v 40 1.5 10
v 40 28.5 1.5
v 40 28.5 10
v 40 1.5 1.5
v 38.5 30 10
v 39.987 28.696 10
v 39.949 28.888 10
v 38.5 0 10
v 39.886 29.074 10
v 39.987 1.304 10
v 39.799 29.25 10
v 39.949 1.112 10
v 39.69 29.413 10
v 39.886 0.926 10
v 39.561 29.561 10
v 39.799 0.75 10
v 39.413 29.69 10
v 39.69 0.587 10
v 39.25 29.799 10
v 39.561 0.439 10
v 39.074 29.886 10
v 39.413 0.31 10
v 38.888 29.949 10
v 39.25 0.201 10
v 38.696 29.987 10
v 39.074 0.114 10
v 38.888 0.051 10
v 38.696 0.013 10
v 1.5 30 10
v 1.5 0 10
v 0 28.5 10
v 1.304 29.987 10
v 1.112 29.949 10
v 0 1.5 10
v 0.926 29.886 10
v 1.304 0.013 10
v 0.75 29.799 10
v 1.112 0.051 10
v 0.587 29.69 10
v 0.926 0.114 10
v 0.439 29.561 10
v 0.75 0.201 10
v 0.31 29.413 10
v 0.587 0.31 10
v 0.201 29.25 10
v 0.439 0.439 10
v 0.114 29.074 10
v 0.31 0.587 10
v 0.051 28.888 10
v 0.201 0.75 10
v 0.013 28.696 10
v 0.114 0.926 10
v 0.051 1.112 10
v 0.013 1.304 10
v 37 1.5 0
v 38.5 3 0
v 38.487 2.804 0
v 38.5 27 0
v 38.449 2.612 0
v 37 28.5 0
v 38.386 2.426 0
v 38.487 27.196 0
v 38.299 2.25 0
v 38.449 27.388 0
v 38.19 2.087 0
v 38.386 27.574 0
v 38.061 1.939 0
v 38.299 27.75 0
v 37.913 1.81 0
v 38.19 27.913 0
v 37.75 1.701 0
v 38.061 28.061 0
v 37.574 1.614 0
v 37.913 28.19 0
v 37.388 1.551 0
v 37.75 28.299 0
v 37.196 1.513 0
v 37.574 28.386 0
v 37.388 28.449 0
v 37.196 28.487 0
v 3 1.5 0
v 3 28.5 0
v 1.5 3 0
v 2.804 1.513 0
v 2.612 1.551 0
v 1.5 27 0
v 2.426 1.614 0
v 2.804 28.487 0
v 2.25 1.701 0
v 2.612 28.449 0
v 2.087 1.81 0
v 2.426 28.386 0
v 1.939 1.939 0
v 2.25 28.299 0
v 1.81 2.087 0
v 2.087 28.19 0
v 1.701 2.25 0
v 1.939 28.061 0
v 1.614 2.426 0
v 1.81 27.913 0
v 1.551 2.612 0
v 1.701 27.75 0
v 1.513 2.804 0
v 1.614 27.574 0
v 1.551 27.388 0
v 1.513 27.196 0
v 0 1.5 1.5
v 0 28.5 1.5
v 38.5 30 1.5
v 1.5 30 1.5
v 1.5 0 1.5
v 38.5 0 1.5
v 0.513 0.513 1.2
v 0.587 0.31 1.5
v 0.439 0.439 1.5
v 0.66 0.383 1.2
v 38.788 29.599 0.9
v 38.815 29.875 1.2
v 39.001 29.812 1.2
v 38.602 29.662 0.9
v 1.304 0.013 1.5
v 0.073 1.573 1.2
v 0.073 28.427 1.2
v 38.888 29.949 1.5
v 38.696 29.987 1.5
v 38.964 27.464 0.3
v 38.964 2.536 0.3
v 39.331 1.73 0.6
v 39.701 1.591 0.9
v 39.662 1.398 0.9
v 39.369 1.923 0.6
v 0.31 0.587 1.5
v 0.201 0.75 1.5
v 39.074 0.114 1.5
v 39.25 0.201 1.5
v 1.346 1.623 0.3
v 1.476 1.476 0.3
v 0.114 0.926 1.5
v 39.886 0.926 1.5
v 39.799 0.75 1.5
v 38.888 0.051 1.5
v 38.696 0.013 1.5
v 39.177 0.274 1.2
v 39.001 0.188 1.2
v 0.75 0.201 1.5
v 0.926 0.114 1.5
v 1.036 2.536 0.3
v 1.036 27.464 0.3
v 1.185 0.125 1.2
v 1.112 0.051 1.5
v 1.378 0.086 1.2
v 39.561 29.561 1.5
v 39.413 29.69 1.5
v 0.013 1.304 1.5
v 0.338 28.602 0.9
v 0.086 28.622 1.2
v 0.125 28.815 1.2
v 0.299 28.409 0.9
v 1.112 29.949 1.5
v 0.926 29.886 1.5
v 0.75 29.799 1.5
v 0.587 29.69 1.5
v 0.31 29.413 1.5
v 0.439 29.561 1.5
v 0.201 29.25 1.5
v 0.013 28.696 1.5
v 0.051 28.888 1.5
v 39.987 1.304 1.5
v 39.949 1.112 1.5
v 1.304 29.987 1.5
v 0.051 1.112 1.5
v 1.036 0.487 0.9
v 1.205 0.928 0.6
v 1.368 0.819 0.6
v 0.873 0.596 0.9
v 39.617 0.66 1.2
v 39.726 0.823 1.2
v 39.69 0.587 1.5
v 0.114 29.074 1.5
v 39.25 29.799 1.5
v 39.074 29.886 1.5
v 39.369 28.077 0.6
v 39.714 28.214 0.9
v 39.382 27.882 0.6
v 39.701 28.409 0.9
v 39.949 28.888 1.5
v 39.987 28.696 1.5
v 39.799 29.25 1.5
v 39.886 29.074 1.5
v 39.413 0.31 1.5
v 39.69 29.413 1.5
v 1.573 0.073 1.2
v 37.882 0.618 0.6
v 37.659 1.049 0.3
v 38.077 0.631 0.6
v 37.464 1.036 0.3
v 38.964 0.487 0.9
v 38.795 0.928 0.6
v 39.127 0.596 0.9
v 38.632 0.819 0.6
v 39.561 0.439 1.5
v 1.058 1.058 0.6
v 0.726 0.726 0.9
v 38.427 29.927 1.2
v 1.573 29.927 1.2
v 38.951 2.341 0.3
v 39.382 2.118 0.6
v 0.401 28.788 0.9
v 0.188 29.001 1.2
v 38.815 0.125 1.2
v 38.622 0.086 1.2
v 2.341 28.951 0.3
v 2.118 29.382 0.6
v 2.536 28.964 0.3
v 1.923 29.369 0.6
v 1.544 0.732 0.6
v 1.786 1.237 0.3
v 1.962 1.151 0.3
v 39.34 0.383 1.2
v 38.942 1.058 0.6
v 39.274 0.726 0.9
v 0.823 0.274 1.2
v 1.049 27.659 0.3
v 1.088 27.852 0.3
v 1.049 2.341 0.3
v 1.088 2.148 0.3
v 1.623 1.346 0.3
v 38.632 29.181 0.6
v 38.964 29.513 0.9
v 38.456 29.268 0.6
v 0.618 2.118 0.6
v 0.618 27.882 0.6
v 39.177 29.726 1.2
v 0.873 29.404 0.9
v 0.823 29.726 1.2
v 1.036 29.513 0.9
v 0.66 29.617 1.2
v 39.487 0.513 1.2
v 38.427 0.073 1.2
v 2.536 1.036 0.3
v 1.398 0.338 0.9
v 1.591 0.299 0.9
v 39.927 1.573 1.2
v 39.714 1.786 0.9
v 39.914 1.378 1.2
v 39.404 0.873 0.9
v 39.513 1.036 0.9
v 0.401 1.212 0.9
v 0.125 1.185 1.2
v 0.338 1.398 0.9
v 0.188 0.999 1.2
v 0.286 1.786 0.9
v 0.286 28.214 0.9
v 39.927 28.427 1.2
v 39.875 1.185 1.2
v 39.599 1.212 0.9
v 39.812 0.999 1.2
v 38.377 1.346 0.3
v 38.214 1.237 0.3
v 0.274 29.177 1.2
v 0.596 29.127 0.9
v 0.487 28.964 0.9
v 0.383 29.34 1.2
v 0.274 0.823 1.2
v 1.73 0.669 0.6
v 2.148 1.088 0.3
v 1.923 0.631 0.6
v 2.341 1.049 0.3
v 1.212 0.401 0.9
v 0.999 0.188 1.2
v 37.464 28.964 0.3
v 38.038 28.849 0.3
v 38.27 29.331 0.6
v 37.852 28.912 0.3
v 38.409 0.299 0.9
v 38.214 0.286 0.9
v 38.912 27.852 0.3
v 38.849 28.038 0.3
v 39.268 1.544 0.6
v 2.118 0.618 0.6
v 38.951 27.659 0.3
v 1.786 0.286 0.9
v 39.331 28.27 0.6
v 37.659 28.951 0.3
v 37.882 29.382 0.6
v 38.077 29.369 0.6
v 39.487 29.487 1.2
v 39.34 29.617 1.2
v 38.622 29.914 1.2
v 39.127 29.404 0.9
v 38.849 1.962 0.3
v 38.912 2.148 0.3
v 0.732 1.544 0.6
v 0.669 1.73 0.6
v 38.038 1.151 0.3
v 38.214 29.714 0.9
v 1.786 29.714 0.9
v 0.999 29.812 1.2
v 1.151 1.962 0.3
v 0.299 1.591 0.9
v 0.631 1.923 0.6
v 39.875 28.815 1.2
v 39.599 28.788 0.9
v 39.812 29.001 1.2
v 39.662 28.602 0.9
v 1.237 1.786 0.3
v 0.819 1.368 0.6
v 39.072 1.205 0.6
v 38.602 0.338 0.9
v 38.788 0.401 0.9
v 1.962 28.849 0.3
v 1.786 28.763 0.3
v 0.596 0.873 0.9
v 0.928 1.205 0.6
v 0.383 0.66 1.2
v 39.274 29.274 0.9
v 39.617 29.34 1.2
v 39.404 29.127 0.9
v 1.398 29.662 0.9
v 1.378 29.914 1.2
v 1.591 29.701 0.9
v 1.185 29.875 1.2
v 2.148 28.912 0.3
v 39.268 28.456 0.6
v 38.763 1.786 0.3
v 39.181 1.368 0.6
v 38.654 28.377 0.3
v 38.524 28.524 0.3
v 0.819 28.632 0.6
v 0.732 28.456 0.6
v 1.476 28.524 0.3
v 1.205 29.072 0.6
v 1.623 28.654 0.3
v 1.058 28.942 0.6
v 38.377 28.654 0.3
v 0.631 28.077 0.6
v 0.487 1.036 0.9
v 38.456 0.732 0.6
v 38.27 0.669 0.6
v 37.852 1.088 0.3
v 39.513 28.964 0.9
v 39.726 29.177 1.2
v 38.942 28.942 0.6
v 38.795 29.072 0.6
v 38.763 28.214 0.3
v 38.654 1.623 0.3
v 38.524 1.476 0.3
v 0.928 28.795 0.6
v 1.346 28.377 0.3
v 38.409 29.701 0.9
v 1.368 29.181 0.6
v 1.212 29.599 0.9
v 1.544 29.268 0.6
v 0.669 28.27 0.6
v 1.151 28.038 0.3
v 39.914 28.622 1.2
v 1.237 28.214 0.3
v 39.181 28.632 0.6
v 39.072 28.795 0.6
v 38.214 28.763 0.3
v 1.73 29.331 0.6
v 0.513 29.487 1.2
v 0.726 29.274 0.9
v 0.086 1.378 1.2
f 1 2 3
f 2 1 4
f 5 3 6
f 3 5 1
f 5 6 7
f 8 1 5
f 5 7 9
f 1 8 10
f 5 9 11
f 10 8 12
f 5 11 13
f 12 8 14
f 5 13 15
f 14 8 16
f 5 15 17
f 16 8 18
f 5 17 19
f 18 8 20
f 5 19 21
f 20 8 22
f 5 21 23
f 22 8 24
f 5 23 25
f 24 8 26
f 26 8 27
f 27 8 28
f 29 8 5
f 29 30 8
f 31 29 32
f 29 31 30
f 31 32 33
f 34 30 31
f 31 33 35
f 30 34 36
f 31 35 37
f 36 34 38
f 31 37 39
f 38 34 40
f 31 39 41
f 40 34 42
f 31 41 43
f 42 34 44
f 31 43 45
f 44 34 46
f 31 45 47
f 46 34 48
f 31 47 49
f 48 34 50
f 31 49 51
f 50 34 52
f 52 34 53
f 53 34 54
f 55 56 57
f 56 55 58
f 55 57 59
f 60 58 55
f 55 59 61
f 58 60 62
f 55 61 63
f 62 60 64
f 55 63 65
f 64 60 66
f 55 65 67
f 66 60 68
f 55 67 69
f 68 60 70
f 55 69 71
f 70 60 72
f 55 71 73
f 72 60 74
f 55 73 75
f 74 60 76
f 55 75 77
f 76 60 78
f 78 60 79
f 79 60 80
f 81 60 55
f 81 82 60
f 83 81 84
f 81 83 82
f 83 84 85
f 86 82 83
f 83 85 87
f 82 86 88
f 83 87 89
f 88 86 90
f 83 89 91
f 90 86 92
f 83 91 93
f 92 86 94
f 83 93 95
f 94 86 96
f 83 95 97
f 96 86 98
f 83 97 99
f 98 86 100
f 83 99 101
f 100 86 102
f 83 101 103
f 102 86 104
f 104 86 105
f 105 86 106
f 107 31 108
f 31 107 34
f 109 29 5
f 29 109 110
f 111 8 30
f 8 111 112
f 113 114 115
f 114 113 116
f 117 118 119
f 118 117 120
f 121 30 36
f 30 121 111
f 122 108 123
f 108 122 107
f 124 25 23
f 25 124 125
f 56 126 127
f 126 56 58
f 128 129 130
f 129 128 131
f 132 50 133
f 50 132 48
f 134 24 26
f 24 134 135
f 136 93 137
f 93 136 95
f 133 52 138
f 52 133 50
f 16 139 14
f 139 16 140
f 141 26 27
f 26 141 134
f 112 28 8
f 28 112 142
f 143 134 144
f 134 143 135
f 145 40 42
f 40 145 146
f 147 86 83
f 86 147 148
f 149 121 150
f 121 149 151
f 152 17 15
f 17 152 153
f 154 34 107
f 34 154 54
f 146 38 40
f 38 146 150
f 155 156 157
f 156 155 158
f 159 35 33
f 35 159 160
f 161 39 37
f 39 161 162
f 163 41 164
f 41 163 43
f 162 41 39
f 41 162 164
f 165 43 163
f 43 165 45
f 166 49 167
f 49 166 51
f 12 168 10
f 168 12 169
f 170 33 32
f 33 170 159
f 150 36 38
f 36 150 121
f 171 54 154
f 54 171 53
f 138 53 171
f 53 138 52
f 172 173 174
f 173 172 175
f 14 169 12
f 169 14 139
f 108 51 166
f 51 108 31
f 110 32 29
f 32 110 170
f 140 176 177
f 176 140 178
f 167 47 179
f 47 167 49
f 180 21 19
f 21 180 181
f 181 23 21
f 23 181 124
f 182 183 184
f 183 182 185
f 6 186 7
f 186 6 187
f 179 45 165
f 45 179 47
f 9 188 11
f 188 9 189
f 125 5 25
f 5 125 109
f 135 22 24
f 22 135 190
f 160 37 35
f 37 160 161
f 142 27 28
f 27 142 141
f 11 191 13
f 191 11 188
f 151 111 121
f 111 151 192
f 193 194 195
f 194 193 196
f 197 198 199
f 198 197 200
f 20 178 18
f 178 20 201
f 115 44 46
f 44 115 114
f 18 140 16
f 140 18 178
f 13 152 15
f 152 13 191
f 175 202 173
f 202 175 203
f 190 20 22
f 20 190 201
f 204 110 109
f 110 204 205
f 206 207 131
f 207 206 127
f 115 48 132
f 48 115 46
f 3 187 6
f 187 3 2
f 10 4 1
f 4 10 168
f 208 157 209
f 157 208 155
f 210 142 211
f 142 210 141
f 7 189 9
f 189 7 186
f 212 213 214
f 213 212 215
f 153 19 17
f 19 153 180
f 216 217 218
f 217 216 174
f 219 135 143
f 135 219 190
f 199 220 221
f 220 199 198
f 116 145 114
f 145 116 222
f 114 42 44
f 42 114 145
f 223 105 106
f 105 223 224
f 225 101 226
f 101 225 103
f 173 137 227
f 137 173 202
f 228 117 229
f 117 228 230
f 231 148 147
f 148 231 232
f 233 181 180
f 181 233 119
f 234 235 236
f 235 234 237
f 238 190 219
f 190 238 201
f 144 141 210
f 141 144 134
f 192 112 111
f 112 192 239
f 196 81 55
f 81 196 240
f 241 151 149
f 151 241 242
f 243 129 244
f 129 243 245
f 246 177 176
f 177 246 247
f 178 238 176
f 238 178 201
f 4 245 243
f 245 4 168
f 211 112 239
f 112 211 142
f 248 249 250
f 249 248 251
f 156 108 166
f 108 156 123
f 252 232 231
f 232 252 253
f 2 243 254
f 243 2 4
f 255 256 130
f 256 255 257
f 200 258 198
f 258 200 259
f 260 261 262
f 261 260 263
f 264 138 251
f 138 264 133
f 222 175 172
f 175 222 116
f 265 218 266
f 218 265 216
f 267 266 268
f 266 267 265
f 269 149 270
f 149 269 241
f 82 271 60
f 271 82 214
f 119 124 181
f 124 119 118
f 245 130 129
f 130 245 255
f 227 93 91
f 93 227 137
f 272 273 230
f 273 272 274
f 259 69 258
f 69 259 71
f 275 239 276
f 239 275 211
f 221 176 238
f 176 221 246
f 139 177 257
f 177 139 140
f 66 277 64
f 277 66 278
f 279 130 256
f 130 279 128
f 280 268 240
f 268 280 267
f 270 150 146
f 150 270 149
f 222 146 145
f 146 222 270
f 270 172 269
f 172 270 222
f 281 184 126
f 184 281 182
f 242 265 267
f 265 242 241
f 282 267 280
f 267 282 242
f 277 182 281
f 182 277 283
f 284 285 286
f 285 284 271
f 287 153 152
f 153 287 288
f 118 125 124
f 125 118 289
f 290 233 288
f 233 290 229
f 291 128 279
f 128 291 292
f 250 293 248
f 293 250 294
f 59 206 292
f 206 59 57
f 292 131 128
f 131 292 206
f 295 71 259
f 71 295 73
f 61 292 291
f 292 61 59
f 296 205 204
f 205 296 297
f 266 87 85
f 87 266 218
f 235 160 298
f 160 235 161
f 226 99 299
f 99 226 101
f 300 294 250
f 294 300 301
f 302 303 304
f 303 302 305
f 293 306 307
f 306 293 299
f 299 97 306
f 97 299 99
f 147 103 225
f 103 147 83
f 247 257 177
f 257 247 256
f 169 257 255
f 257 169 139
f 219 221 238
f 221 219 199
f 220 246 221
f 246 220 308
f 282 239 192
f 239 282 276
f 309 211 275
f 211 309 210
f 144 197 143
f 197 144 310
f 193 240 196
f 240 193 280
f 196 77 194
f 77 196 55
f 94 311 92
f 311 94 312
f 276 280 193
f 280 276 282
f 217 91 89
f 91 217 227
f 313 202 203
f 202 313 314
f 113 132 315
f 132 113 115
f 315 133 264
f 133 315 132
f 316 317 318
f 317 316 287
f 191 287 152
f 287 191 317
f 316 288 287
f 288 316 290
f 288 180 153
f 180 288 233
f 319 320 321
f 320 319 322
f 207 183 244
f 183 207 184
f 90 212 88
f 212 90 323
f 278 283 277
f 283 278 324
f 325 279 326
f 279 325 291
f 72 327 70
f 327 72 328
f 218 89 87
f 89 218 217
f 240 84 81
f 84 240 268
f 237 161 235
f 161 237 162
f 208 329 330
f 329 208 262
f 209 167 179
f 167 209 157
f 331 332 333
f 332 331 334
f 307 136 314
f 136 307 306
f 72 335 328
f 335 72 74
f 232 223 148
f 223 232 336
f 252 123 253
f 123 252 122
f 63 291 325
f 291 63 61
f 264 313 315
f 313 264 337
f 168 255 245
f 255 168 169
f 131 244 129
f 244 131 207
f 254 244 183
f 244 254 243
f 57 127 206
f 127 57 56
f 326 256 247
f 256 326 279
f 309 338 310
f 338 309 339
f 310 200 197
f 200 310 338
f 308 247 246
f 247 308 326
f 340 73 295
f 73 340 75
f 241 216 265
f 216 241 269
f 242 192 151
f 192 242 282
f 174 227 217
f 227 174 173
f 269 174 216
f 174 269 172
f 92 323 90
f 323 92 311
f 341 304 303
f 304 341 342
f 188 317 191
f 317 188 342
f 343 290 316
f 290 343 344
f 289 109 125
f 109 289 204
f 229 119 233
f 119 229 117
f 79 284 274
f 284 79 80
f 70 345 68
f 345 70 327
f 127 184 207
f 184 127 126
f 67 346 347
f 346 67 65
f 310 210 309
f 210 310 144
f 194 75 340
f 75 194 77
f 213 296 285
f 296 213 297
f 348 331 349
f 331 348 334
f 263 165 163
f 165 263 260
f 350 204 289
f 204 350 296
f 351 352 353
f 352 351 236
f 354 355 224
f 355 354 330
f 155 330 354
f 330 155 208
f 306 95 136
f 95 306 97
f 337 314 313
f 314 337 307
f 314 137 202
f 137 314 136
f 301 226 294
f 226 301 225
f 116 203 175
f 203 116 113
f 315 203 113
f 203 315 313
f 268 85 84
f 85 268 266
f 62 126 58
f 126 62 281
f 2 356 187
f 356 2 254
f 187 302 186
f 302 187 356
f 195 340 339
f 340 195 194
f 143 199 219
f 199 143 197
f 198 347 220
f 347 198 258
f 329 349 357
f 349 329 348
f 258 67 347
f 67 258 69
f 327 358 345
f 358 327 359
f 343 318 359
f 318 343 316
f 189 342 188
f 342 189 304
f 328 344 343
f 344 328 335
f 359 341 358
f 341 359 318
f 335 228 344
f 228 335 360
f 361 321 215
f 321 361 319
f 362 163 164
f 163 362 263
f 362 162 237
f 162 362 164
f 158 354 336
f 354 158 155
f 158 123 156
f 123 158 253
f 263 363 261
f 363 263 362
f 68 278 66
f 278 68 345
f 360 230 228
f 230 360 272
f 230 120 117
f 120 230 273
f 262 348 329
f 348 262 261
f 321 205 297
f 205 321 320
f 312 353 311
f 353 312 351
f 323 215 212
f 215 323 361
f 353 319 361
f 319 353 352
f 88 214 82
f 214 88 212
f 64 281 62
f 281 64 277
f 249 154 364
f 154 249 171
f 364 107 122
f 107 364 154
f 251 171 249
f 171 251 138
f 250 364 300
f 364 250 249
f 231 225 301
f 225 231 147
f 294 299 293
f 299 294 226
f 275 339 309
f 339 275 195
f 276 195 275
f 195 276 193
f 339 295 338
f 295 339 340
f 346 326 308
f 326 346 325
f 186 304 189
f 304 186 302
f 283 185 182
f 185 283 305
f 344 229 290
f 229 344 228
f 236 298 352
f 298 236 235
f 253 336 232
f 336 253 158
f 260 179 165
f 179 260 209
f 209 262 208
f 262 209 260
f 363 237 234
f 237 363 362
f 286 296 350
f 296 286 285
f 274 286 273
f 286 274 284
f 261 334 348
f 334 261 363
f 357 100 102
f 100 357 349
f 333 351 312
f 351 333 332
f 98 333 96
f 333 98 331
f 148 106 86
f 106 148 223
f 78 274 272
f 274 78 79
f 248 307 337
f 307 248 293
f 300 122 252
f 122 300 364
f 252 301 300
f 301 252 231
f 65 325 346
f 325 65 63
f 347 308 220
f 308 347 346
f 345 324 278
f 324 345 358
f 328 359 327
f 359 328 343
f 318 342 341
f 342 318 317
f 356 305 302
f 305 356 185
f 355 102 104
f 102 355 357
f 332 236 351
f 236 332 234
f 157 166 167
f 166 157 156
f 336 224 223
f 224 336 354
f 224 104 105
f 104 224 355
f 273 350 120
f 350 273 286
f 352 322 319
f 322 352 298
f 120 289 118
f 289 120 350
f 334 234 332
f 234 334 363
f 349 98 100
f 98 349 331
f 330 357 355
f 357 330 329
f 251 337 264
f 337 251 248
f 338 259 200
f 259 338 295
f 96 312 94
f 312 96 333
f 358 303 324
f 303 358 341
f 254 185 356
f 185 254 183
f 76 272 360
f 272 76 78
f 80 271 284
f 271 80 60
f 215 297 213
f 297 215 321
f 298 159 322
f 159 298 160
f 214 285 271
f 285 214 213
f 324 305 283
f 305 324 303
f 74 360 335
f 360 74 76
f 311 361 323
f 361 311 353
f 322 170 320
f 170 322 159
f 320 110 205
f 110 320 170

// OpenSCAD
// units=mm — generated by scad_emitter.py
// part=unnamed
$fn = 48;

intersection() { cube([40, 30, 10]); hull() { translate([3, 3, 0]) linear_extrude(height=0.01) offset(r=1.5) square([34, 24]); translate([2.5365, 2.5365, 0.3]) linear_extrude(height=0.01) offset(r=1.5) square([34.9271, 24.9271]); translate([2.1183, 2.1183, 0.6]) linear_extrude(height=0.01) offset(r=1.5) square([35.7634, 25.7634]); translate([1.7865, 1.7865, 0.9]) linear_extrude(height=0.01) offset(r=1.5) square([36.4271, 26.4271]); translate([1.5734, 1.5734, 1.2]) linear_extrude(height=0.01) offset(r=1.5) square([36.8532, 26.8532]); translate([1.5, 1.5, 1.5]) linear_extrude(height=0.01) offset(r=1.5) square([37, 27]); translate([1.5, 1.5, 10]) linear_extrude(height=0.01) offset(r=1.5) square([37, 27]); } }
